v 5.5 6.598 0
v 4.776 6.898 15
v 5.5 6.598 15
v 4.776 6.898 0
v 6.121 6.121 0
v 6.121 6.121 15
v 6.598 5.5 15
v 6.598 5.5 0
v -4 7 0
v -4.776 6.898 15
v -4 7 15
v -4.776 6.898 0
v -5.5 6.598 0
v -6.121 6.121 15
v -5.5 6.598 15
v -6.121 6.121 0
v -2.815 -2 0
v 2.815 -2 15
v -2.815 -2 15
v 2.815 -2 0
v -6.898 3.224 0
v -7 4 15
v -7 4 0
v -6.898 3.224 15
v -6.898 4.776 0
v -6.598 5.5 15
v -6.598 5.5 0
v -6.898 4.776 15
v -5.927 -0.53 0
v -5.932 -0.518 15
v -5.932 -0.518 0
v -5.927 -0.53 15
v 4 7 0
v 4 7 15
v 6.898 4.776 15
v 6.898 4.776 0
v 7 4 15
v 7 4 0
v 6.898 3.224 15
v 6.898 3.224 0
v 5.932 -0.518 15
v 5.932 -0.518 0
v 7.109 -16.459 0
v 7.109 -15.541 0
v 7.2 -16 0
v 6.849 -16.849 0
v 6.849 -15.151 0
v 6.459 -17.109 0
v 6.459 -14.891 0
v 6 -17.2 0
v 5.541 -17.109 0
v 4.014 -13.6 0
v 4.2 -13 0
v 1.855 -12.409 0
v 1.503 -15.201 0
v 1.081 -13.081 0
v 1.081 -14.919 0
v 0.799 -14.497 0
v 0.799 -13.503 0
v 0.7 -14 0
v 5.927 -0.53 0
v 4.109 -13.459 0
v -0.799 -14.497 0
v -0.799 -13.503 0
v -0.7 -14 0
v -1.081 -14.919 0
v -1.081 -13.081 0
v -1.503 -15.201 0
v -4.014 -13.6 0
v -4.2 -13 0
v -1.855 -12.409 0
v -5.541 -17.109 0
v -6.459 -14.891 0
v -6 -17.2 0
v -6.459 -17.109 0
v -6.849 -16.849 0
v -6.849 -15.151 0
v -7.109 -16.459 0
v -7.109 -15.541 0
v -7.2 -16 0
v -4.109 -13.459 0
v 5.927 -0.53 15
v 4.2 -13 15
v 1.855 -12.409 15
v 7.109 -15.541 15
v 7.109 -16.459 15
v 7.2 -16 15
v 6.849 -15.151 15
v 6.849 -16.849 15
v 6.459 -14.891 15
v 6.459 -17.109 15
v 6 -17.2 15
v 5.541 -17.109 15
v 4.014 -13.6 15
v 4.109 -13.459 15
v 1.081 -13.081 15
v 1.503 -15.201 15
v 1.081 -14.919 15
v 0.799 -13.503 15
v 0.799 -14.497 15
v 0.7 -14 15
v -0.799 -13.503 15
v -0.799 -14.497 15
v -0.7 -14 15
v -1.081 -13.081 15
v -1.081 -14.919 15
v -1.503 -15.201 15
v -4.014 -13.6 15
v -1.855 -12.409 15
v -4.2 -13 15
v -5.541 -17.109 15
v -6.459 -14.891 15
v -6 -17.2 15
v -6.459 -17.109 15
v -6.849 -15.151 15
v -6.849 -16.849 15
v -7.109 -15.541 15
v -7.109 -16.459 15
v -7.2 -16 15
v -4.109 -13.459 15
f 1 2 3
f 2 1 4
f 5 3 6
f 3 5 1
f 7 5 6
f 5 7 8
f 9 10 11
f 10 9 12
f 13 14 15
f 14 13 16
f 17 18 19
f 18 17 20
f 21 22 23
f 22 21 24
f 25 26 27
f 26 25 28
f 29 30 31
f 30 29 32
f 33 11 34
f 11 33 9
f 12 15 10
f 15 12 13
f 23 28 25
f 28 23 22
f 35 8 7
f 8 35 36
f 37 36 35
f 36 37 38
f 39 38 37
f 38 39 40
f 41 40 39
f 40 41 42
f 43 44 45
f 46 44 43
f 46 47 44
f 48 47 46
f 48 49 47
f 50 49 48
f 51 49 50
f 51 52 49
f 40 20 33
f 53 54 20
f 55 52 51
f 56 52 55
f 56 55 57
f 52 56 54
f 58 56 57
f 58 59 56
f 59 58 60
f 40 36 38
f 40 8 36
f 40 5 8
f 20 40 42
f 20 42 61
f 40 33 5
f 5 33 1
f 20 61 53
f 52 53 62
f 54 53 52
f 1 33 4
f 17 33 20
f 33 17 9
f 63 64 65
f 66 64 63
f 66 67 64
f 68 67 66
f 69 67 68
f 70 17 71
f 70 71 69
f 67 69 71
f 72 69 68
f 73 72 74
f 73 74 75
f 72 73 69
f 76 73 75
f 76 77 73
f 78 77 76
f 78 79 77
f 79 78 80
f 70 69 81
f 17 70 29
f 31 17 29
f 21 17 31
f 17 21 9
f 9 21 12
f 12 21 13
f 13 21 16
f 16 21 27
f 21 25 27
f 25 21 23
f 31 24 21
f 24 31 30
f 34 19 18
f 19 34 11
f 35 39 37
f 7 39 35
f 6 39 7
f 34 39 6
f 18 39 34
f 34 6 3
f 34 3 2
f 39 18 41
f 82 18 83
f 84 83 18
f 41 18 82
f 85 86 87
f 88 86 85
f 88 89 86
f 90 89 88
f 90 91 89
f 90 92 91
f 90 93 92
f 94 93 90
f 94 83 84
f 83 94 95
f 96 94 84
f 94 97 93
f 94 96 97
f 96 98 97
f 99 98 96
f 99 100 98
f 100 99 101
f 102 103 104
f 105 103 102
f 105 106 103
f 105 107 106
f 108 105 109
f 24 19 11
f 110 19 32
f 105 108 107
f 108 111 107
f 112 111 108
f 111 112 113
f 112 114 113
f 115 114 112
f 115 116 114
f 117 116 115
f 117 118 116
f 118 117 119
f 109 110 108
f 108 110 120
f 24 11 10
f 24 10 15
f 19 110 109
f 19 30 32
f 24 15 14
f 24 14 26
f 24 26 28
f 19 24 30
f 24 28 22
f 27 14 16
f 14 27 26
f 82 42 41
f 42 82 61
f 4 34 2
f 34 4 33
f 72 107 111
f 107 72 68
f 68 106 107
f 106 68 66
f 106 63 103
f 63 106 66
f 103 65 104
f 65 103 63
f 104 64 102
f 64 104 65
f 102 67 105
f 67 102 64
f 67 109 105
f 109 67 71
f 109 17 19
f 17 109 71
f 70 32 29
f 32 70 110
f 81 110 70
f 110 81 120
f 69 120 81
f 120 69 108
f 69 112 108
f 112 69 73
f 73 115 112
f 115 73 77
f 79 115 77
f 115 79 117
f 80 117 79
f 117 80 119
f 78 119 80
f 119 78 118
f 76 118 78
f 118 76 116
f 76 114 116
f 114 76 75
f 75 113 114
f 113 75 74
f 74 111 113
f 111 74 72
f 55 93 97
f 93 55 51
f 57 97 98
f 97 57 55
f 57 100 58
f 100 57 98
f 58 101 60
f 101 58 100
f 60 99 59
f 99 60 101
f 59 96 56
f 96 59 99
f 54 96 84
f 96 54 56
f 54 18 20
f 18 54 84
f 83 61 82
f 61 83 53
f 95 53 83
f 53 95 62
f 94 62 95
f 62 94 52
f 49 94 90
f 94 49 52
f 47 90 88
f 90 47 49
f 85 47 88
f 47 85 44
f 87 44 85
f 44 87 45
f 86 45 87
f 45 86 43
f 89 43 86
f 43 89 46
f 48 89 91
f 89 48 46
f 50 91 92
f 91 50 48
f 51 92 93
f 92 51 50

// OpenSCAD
module dualCircleHull(t1, r1, t2, r2) {
  hull() {
    translate(t1)
    circle(r1);
    
    translate(t2)
    circle(r2);
  }
}

module fin() {
  $fn=16;
  union() {
    dualCircleHull(
      [0,0,0], 1.2,
      [4,2,0], 1.3
    );
    
    dualCircleHull(
      [4,2,0], 1.3,
      [3,3,0], 1.2
    );
    
    dualCircleHull(
      [3,3,0], 1.2,
      [1.5,16,0], 1.5
    );
  }
}

module finExtruded(h=15) {
  linear_extrude(height=h)
    fin();
}

module handle(){
  $fn=24;
  rotate([0,0,90])
  hull() {
    dualCircleHull(
      [0,4,0], 2,
      [0,-4,0], 2
    );
    
    dualCircleHull(
      [4,4,0], 3,
      [4,-4,0], 3
    );
  }
}

union() {
  linear_extrude(height=15)
    handle();

  translate([-6,-16,0])
  finExtruded();

  mirror([1,0,0])
  translate([-6,-16,0])
  finExtruded();
}
